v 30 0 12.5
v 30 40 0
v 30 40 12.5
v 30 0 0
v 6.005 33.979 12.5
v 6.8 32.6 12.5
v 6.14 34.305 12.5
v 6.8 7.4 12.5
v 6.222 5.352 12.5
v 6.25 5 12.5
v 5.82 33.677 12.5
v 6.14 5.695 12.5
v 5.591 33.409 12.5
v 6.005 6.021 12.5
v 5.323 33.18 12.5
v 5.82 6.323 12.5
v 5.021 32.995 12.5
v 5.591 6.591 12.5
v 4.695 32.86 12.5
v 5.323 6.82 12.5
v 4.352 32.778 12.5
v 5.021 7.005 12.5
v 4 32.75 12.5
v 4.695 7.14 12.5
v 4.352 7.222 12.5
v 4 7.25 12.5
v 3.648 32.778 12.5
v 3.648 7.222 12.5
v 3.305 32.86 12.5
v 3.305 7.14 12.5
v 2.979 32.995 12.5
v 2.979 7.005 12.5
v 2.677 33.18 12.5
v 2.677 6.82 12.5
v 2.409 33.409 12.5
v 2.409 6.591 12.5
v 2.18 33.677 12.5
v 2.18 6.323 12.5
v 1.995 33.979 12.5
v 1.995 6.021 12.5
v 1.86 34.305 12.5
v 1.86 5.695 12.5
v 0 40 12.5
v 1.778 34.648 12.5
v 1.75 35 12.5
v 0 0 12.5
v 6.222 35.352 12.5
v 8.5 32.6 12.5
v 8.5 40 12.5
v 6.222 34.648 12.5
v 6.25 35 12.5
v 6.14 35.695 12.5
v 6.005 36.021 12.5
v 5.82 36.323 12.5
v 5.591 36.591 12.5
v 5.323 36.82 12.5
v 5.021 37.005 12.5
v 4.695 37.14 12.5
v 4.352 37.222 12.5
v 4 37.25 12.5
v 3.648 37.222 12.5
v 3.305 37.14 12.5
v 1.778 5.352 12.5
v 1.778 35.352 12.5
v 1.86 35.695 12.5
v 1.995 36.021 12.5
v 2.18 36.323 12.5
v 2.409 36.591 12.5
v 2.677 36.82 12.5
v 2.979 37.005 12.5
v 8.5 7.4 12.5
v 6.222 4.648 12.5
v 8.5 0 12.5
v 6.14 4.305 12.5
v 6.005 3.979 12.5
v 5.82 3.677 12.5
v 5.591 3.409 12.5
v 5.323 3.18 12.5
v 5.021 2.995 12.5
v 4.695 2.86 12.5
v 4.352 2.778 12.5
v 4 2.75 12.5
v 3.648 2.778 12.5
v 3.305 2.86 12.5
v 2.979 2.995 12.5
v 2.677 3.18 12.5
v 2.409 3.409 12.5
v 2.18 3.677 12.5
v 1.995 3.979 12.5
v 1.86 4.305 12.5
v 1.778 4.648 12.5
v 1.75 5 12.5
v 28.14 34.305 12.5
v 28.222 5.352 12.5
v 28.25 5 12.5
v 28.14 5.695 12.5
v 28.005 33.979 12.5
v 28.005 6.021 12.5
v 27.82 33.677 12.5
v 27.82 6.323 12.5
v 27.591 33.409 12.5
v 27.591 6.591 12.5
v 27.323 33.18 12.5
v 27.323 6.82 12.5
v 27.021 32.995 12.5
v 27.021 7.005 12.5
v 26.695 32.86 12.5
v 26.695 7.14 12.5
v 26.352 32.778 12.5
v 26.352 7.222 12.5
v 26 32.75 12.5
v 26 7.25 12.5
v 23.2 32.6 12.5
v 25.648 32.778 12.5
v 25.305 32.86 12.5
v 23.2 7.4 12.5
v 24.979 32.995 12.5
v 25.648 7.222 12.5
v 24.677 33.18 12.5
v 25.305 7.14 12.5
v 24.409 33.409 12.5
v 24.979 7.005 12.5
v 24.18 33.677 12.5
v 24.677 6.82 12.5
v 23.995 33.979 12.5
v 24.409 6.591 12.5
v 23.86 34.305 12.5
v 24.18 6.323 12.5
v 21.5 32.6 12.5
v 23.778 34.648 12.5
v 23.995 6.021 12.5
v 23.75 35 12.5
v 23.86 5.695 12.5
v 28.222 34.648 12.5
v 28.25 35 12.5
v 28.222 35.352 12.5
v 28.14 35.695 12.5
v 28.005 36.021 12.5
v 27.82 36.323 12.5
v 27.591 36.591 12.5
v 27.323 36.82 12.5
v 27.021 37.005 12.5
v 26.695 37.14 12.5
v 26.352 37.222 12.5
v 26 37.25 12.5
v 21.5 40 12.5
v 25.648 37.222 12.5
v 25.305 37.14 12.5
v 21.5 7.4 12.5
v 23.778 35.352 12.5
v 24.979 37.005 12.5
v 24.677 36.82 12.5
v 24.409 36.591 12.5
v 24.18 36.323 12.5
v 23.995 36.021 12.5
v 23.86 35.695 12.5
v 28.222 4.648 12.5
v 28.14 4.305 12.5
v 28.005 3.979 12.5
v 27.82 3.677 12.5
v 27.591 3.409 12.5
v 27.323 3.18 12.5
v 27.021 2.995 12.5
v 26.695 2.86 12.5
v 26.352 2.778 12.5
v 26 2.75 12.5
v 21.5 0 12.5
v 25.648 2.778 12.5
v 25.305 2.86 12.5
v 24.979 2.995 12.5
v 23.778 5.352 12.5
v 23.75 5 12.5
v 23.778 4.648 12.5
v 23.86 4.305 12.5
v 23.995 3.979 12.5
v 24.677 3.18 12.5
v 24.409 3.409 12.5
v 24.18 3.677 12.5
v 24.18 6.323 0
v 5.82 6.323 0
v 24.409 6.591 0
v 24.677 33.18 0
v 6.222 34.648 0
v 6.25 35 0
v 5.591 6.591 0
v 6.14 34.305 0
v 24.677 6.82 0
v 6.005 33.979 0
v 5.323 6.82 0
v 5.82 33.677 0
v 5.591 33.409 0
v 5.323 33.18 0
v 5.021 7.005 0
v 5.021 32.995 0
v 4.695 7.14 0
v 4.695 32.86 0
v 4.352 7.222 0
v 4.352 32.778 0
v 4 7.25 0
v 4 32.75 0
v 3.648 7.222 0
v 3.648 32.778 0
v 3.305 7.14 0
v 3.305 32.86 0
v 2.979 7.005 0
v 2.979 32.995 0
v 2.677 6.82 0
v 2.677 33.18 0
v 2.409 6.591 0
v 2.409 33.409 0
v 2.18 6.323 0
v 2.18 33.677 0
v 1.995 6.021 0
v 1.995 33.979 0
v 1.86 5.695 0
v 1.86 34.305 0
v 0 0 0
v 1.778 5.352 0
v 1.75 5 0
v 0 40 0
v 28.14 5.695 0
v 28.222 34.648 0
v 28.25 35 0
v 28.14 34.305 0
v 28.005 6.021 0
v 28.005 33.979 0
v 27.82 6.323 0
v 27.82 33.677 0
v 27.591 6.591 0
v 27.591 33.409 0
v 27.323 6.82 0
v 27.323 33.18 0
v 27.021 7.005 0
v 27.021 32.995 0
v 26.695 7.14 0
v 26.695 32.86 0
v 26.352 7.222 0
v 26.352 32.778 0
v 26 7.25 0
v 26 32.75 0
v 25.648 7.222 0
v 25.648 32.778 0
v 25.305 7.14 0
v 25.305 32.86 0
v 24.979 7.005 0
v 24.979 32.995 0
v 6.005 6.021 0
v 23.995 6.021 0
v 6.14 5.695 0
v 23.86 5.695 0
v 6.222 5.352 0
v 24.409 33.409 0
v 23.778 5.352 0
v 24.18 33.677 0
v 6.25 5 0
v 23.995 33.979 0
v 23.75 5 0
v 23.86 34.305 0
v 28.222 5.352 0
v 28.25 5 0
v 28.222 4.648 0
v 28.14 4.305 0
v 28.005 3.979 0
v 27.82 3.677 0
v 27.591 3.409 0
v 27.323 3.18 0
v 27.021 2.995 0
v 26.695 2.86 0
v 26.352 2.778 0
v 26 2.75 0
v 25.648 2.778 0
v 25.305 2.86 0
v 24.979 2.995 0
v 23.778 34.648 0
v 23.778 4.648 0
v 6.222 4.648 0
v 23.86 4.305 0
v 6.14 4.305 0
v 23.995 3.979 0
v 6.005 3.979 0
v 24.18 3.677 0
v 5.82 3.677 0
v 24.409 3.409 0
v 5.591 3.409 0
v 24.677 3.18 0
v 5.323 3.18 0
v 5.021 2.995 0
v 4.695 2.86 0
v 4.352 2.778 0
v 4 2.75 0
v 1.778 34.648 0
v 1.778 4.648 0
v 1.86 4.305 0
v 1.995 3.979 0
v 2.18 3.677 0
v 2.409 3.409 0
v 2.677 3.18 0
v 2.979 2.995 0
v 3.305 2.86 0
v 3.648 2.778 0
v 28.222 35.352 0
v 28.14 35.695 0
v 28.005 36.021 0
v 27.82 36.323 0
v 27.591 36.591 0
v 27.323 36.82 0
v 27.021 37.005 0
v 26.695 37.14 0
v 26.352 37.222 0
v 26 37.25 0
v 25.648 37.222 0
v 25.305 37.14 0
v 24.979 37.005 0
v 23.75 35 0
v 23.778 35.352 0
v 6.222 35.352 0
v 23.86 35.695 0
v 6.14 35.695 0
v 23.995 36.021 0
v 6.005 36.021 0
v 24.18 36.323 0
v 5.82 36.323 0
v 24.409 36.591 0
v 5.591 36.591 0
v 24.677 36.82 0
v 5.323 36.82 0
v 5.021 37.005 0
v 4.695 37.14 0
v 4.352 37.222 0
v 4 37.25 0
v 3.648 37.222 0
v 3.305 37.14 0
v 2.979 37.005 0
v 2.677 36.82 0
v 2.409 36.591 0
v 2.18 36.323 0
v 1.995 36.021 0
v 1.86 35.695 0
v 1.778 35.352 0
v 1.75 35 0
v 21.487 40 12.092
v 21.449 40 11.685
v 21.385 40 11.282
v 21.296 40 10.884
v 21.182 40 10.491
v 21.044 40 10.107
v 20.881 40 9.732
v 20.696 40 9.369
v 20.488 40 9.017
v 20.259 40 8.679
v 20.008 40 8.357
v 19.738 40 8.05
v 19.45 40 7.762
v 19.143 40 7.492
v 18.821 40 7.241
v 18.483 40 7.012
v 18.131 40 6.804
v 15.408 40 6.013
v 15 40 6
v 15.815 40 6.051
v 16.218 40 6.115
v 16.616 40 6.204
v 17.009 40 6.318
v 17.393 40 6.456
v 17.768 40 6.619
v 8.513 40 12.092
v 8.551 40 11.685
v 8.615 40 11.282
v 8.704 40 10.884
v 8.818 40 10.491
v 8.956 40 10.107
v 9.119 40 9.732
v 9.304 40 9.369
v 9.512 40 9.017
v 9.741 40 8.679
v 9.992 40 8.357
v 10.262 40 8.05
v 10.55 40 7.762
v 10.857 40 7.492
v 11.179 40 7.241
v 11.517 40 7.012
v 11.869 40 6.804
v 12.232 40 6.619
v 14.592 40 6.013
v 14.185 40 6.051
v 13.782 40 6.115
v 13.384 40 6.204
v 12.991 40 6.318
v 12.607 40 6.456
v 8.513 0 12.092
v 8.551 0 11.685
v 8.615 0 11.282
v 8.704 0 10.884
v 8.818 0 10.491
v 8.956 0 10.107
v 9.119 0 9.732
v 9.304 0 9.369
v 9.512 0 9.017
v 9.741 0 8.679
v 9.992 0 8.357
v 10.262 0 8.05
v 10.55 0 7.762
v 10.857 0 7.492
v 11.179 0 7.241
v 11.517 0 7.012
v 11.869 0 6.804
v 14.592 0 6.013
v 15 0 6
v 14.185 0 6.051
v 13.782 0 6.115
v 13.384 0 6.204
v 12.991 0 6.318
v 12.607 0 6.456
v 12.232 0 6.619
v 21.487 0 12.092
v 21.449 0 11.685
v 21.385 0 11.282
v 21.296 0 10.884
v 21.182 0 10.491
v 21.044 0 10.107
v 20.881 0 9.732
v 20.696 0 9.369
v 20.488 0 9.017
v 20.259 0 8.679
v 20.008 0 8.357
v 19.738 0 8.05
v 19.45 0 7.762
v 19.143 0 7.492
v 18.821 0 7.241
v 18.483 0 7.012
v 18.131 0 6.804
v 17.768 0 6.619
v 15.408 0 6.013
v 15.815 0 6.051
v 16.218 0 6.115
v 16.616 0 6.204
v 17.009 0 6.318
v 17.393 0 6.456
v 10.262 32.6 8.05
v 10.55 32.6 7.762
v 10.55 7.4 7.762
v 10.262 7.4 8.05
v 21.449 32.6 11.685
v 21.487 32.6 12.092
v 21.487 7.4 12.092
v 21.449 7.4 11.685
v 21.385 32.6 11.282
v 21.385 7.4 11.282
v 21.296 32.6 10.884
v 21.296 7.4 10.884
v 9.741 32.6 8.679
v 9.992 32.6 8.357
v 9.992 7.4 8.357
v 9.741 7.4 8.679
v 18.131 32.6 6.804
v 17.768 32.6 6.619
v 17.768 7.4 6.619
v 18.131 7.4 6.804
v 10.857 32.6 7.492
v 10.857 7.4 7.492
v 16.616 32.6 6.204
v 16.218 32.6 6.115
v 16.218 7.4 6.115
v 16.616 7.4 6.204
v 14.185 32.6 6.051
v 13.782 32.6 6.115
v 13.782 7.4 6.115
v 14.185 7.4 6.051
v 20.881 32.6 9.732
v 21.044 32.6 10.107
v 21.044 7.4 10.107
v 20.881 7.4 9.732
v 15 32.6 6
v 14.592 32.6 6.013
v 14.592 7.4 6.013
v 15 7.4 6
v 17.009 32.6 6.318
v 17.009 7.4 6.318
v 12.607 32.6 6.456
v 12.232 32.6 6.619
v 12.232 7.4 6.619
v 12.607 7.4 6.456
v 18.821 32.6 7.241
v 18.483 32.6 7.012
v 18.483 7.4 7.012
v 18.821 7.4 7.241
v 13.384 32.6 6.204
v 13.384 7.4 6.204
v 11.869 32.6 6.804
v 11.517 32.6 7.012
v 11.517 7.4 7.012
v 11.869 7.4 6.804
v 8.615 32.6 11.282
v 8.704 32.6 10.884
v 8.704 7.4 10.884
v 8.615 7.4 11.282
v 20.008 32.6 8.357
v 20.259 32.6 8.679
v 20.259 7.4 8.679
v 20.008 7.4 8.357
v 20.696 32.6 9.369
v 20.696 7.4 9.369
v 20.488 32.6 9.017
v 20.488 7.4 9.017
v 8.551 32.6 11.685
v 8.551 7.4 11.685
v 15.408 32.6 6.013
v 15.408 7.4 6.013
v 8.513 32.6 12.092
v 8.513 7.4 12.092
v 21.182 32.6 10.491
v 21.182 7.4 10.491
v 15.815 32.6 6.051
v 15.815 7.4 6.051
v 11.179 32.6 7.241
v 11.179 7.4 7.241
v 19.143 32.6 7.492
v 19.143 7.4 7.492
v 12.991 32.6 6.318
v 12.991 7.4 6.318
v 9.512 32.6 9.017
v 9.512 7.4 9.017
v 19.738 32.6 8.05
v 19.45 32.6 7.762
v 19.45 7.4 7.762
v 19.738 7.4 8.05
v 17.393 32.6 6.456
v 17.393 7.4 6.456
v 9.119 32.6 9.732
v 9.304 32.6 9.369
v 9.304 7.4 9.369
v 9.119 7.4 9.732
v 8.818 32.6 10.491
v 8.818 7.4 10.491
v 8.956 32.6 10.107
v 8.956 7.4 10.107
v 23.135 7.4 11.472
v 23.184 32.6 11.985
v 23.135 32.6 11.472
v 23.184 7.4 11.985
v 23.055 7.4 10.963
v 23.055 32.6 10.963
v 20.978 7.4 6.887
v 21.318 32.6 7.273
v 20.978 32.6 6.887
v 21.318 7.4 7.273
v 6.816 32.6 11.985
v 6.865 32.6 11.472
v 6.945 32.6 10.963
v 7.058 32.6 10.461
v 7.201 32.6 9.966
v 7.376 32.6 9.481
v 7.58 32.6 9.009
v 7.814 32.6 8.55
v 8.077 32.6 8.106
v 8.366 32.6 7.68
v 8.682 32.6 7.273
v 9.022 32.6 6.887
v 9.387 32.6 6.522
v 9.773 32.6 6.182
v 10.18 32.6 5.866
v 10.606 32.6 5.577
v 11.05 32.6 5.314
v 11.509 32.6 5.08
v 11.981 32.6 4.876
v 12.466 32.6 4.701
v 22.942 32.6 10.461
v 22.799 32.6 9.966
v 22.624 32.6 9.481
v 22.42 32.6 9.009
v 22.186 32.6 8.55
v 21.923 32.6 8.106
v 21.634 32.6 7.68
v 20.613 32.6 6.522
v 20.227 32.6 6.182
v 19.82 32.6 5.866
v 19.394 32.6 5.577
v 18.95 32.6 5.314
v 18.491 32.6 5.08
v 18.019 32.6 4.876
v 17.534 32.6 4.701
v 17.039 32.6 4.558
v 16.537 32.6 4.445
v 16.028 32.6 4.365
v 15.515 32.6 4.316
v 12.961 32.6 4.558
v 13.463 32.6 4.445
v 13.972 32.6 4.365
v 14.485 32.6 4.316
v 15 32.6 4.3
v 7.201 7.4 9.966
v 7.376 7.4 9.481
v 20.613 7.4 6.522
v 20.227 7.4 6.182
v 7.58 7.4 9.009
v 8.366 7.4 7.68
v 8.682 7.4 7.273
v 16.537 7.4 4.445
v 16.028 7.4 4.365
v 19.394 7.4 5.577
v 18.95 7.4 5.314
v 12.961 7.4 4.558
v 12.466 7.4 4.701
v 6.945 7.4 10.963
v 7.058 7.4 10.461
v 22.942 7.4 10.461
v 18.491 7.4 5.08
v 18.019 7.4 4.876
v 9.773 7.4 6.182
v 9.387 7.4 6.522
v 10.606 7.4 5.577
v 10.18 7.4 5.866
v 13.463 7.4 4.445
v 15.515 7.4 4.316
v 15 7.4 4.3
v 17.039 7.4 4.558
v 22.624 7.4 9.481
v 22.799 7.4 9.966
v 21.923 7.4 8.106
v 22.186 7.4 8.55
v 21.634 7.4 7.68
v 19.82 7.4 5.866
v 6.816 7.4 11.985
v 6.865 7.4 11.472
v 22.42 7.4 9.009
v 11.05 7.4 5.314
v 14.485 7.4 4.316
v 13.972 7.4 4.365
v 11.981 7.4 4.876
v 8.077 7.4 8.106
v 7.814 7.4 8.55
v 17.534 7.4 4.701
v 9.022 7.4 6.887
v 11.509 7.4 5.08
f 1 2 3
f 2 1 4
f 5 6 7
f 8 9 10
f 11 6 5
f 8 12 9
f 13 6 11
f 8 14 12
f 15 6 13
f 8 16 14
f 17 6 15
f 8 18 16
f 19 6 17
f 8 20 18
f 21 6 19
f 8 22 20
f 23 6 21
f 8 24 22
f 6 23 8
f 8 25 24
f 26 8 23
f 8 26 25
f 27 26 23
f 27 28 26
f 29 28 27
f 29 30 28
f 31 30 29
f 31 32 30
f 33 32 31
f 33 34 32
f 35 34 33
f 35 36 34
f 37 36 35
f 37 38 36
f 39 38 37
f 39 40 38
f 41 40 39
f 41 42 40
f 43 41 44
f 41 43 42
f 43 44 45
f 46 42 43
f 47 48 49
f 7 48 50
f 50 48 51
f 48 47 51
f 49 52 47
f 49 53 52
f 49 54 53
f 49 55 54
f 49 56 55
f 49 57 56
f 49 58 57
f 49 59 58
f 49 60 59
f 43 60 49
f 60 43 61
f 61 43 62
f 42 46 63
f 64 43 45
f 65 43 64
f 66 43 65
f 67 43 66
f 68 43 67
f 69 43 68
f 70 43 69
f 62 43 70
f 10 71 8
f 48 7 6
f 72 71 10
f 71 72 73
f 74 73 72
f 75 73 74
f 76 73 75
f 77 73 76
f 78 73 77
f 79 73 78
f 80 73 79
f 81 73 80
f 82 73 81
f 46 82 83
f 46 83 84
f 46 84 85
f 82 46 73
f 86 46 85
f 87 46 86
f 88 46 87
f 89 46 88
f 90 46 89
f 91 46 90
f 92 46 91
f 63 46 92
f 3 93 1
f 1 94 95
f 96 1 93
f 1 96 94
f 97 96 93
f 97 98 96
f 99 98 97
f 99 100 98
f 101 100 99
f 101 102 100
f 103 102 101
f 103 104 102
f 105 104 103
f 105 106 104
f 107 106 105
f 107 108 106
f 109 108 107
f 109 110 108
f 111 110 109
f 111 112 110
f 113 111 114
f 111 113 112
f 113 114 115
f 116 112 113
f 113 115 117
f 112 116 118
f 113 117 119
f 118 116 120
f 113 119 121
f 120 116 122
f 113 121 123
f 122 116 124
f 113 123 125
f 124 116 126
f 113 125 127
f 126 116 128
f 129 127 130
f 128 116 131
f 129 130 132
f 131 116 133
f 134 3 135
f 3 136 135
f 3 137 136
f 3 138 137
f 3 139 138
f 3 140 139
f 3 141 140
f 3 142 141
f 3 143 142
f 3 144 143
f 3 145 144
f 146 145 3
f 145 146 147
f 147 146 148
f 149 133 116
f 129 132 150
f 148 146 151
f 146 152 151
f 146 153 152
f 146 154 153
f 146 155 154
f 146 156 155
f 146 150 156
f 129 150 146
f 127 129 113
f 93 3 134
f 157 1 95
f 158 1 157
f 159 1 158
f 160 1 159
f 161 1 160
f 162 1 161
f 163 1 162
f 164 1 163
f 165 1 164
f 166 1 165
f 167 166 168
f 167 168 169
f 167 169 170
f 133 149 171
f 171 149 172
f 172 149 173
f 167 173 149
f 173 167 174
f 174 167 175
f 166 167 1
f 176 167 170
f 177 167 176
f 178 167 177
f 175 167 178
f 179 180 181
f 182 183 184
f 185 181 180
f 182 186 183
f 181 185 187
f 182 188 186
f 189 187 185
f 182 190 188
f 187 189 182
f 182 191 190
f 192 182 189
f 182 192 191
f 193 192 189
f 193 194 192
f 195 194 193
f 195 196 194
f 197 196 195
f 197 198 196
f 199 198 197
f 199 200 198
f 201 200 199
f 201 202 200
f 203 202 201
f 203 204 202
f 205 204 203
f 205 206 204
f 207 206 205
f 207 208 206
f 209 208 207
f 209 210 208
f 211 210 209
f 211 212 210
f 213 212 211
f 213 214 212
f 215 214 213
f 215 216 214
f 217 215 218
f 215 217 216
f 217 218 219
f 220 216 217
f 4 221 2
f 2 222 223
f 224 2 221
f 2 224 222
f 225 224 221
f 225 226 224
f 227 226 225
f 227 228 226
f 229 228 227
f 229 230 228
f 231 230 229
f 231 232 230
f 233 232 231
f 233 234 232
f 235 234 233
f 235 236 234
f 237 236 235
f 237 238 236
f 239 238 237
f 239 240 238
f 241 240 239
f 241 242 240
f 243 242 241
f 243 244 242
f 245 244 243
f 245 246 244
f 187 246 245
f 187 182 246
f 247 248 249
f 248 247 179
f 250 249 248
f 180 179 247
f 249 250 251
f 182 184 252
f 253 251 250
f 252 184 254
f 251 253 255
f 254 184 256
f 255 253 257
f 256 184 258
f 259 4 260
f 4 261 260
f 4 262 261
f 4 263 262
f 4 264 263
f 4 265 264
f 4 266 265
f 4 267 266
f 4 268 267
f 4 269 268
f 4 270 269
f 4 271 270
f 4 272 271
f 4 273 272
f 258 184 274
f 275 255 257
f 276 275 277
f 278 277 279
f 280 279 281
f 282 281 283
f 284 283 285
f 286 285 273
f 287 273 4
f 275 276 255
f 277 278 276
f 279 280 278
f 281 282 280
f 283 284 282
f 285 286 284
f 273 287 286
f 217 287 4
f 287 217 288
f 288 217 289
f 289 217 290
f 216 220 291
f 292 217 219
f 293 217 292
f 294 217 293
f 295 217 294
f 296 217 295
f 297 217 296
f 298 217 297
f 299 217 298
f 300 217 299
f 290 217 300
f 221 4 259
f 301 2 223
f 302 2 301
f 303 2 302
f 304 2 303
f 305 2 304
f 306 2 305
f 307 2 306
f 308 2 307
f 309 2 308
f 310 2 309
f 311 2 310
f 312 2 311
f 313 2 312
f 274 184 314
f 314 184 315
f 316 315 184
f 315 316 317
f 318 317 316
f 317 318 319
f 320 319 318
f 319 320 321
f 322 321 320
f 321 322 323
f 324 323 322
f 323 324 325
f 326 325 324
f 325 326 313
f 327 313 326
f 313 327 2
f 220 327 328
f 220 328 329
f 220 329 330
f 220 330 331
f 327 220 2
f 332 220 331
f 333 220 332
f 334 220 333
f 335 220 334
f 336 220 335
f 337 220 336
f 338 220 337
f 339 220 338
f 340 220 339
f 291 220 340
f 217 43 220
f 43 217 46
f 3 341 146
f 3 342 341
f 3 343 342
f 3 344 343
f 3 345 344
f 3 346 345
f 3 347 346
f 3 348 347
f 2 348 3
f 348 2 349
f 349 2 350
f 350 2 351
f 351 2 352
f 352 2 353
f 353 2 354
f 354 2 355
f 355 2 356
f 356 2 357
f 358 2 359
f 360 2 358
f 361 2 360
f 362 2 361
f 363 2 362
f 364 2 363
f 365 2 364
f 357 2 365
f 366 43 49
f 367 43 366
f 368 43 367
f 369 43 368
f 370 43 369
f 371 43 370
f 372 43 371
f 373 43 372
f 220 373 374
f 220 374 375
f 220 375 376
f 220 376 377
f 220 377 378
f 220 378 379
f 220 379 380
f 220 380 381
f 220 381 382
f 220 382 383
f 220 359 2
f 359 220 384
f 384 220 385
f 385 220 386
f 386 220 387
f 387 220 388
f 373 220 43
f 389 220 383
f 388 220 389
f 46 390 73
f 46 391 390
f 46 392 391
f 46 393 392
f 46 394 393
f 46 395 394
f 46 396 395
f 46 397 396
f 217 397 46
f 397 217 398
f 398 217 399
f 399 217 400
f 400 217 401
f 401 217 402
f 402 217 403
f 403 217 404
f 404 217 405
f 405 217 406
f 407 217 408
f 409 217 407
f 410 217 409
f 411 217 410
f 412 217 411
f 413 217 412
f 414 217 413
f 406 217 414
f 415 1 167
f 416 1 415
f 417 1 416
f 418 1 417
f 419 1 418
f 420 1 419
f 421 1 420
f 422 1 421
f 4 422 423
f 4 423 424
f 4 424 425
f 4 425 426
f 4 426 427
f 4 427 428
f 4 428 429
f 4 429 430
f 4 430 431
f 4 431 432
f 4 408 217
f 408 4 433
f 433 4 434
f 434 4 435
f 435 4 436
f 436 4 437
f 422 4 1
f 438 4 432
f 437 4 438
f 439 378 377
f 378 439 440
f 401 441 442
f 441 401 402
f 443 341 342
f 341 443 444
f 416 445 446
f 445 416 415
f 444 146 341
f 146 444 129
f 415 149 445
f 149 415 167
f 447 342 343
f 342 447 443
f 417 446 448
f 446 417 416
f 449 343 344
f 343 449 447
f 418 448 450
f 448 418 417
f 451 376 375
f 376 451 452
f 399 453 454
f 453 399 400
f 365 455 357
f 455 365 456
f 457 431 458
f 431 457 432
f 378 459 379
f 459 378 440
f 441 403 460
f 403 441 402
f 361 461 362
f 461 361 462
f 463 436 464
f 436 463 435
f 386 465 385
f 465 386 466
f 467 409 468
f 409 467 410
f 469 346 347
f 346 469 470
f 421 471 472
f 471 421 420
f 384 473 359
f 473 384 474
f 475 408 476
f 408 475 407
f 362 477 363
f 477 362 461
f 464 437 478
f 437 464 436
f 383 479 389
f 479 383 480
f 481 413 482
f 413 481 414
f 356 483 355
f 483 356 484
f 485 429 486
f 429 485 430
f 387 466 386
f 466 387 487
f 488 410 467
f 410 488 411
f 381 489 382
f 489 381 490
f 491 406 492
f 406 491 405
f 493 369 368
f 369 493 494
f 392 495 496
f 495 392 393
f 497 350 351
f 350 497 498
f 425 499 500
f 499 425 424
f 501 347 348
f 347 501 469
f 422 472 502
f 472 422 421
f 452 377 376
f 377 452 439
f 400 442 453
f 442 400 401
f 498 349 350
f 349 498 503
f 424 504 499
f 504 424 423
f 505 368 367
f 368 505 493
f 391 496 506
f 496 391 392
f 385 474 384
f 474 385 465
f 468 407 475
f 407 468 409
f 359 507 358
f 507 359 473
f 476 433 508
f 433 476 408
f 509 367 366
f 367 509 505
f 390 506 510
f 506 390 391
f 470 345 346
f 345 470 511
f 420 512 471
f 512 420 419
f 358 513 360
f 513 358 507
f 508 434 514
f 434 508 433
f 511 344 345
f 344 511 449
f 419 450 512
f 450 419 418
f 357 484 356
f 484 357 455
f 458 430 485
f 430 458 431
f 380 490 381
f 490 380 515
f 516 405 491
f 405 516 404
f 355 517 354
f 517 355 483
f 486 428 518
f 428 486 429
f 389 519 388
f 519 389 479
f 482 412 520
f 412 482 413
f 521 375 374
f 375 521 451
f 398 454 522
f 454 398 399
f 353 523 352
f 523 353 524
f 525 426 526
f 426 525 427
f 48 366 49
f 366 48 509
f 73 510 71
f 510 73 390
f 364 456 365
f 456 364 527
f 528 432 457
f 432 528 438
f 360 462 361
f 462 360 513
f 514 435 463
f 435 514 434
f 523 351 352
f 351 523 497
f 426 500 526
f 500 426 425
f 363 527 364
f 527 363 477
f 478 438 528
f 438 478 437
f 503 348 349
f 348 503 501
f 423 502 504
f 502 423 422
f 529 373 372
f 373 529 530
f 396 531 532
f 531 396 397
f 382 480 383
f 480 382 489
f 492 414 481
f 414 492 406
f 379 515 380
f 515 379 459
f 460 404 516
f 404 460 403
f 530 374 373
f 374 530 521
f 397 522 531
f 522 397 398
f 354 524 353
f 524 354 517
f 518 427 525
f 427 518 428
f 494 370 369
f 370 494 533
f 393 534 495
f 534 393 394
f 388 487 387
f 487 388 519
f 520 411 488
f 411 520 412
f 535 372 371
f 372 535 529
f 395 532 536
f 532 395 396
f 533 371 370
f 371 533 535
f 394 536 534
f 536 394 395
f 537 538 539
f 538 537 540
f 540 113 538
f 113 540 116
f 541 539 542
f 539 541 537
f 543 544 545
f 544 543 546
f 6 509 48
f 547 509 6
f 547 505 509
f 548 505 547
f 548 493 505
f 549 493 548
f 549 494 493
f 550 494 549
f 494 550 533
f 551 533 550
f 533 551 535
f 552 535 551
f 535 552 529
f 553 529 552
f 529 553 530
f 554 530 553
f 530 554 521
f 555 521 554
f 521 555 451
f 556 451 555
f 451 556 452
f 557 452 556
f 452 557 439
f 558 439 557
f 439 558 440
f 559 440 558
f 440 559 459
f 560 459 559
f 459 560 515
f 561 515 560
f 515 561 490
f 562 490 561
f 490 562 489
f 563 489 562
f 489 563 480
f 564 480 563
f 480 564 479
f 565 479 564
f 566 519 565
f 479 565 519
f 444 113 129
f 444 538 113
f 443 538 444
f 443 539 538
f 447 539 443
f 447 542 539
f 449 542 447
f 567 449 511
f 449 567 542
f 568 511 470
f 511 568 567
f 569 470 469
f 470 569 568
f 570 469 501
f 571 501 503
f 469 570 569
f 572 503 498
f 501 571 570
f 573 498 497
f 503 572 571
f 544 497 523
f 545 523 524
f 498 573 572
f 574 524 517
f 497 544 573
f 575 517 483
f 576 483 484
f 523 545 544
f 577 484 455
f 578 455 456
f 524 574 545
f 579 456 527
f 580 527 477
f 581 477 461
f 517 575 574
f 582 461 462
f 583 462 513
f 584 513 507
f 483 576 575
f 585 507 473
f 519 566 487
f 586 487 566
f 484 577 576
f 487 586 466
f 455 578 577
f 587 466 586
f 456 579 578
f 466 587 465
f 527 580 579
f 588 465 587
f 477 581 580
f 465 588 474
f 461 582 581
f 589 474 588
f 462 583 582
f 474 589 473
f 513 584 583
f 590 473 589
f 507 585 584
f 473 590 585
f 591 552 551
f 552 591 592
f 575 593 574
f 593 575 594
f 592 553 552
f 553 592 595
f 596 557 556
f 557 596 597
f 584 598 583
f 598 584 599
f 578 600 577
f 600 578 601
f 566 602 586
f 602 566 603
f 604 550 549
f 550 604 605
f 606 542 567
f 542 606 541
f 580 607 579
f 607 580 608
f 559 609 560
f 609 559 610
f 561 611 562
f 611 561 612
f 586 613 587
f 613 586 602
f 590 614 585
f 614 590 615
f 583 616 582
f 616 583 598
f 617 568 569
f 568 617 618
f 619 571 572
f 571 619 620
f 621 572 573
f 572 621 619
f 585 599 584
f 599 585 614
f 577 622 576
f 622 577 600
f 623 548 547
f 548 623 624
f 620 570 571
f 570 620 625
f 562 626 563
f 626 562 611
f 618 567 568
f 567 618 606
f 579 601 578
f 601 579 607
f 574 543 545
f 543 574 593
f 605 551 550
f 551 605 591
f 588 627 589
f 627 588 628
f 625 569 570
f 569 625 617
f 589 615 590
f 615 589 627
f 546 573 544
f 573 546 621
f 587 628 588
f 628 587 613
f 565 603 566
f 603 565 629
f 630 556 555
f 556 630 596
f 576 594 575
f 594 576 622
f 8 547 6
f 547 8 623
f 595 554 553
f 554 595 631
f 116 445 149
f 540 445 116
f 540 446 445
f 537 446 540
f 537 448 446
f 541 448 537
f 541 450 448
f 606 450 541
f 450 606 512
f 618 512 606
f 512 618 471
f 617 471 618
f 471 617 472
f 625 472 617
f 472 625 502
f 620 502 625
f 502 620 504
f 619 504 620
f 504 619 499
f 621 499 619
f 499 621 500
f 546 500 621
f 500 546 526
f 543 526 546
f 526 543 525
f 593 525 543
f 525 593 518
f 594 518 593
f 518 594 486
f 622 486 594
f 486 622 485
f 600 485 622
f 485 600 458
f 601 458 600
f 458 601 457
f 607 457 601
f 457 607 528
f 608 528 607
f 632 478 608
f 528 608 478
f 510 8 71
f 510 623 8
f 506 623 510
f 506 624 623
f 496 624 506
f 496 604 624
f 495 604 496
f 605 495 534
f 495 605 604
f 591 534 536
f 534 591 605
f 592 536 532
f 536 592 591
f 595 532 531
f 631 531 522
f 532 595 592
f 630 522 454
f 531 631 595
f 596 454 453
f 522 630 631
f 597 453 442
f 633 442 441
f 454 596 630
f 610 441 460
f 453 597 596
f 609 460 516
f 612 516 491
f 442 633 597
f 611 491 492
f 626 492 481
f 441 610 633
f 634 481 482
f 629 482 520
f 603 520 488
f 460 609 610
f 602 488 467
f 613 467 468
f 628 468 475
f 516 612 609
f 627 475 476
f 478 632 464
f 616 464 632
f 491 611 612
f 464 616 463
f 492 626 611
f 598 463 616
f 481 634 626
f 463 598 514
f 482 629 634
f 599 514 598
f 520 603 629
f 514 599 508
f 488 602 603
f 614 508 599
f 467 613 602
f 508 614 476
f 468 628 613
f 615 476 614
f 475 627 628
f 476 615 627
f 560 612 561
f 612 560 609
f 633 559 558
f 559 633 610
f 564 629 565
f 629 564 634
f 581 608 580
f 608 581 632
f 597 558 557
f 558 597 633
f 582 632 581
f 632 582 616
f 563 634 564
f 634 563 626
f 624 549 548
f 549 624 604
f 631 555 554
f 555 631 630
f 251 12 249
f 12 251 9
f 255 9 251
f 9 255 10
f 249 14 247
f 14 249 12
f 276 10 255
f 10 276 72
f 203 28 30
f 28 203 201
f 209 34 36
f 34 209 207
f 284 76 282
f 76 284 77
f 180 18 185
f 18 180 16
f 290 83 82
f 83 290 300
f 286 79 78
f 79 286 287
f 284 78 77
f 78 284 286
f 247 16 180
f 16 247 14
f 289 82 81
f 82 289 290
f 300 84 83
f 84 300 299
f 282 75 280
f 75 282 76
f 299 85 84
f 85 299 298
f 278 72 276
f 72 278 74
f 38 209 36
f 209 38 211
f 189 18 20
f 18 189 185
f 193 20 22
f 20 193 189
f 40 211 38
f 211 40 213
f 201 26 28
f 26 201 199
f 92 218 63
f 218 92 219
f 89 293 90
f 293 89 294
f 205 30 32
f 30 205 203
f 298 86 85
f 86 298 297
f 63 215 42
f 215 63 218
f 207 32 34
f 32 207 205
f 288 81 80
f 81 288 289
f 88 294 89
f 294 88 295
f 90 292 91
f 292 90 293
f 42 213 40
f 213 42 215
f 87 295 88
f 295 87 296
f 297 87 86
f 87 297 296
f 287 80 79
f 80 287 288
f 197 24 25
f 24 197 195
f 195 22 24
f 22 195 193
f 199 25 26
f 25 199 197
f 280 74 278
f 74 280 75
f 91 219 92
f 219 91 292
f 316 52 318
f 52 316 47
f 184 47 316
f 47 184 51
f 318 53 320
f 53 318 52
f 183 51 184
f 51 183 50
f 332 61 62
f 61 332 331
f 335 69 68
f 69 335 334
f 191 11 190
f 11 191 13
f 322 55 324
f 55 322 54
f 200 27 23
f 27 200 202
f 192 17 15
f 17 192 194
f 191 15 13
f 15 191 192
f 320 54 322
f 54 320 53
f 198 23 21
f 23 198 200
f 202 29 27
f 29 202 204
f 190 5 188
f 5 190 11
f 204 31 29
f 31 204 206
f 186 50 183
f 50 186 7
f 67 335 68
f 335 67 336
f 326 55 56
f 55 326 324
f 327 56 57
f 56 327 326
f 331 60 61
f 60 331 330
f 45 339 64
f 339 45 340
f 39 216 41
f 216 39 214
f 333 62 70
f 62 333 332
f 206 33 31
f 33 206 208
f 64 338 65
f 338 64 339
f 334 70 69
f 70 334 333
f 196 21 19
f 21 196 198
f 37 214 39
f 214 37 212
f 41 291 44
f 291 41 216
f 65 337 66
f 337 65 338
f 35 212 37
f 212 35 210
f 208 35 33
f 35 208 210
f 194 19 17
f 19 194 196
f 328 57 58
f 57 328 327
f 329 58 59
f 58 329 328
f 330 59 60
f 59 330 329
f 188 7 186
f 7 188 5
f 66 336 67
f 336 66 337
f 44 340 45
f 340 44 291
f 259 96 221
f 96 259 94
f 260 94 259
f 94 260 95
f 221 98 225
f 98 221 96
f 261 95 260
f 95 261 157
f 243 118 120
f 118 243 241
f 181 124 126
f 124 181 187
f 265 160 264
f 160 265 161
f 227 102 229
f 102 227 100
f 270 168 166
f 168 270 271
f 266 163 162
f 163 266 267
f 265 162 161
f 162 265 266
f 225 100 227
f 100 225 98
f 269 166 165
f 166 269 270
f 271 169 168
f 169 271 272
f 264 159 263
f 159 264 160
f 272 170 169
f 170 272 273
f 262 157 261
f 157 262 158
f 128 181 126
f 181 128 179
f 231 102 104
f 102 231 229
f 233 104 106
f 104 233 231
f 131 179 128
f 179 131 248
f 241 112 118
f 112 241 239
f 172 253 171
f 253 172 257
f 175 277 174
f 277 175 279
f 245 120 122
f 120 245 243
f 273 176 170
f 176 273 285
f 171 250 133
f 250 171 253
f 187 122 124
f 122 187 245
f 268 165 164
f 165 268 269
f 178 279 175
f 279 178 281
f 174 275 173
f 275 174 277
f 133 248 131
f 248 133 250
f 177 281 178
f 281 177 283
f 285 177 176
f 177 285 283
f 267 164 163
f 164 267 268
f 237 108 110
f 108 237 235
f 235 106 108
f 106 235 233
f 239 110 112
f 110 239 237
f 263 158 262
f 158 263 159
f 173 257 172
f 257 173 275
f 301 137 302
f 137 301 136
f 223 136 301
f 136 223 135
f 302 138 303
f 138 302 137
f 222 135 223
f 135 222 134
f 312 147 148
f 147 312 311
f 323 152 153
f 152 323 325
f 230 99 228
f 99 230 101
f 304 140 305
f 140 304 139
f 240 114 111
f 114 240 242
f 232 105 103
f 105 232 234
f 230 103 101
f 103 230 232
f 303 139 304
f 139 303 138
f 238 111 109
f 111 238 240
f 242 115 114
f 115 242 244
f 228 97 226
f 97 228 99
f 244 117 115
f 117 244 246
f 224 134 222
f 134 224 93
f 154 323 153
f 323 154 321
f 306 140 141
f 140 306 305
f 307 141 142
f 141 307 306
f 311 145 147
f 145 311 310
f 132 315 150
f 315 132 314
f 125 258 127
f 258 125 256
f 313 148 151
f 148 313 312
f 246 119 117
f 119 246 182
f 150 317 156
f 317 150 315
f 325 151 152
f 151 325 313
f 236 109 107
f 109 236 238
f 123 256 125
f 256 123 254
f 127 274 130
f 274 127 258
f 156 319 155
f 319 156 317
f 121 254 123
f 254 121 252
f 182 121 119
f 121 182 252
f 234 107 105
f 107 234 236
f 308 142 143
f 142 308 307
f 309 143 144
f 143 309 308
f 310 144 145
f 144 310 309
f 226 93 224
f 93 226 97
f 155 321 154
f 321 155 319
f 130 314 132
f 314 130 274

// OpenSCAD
// RJMP 01-08

blockwidth=30;
blockdepth=40;
screwdistx=4;
screwdisty=5;
d_rjmp=16.4;
l_rjmp=25.2;

!difference() {
	cube([blockwidth, blockdepth, 25/2]);
	translate([blockwidth/2, -1, 25/2]) rotate(90, [-1,0,0]) cylinder(r=13/2, h=100, $fn=100);
	translate([blockwidth/2, (blockdepth-l_rjmp)/2, 25/2]) rotate(90, [-1,0,0]) cylinder(r=d_rjmp/2, h=l_rjmp, $fn=100);

	translate([screwdistx, screwdisty, -1]) cylinder(r=4.5/2, h=100, $fn=40);
	translate([screwdistx, blockdepth-screwdisty, -1]) cylinder(r=4.5/2, h=100, $fn=40);
	translate([blockwidth-screwdistx, screwdisty, -1]) cylinder(r=4.5/2, h=100, $fn=40);
	translate([blockwidth-screwdistx, blockdepth-screwdisty, -1]) cylinder(r=4.5/2, h=100, $fn=40);
}

// Tr10x2 nut
translate([40,0,0])
difference() {
	cube([40, 30, 25/2]);
	translate([20, -1, 25/2]) rotate(90, [-1,0,0]) cylinder(r=13/2, h=100, $fn=100);
	translate([20, (30-20)/2, 25/2]) rotate(90, [-1,0,0]) cylinder(r=22.3/2, h=20, $fn=100);

	translate([5, 5, -1]) cylinder(r=4.5/2, h=100, $fn=40);
	translate([5, 25, -1]) cylinder(r=4.5/2, h=100, $fn=40);
	translate([35, 5, -1]) cylinder(r=4.5/2, h=100, $fn=40);
	translate([35, 25, -1]) cylinder(r=4.5/2, h=100, $fn=40);
}
